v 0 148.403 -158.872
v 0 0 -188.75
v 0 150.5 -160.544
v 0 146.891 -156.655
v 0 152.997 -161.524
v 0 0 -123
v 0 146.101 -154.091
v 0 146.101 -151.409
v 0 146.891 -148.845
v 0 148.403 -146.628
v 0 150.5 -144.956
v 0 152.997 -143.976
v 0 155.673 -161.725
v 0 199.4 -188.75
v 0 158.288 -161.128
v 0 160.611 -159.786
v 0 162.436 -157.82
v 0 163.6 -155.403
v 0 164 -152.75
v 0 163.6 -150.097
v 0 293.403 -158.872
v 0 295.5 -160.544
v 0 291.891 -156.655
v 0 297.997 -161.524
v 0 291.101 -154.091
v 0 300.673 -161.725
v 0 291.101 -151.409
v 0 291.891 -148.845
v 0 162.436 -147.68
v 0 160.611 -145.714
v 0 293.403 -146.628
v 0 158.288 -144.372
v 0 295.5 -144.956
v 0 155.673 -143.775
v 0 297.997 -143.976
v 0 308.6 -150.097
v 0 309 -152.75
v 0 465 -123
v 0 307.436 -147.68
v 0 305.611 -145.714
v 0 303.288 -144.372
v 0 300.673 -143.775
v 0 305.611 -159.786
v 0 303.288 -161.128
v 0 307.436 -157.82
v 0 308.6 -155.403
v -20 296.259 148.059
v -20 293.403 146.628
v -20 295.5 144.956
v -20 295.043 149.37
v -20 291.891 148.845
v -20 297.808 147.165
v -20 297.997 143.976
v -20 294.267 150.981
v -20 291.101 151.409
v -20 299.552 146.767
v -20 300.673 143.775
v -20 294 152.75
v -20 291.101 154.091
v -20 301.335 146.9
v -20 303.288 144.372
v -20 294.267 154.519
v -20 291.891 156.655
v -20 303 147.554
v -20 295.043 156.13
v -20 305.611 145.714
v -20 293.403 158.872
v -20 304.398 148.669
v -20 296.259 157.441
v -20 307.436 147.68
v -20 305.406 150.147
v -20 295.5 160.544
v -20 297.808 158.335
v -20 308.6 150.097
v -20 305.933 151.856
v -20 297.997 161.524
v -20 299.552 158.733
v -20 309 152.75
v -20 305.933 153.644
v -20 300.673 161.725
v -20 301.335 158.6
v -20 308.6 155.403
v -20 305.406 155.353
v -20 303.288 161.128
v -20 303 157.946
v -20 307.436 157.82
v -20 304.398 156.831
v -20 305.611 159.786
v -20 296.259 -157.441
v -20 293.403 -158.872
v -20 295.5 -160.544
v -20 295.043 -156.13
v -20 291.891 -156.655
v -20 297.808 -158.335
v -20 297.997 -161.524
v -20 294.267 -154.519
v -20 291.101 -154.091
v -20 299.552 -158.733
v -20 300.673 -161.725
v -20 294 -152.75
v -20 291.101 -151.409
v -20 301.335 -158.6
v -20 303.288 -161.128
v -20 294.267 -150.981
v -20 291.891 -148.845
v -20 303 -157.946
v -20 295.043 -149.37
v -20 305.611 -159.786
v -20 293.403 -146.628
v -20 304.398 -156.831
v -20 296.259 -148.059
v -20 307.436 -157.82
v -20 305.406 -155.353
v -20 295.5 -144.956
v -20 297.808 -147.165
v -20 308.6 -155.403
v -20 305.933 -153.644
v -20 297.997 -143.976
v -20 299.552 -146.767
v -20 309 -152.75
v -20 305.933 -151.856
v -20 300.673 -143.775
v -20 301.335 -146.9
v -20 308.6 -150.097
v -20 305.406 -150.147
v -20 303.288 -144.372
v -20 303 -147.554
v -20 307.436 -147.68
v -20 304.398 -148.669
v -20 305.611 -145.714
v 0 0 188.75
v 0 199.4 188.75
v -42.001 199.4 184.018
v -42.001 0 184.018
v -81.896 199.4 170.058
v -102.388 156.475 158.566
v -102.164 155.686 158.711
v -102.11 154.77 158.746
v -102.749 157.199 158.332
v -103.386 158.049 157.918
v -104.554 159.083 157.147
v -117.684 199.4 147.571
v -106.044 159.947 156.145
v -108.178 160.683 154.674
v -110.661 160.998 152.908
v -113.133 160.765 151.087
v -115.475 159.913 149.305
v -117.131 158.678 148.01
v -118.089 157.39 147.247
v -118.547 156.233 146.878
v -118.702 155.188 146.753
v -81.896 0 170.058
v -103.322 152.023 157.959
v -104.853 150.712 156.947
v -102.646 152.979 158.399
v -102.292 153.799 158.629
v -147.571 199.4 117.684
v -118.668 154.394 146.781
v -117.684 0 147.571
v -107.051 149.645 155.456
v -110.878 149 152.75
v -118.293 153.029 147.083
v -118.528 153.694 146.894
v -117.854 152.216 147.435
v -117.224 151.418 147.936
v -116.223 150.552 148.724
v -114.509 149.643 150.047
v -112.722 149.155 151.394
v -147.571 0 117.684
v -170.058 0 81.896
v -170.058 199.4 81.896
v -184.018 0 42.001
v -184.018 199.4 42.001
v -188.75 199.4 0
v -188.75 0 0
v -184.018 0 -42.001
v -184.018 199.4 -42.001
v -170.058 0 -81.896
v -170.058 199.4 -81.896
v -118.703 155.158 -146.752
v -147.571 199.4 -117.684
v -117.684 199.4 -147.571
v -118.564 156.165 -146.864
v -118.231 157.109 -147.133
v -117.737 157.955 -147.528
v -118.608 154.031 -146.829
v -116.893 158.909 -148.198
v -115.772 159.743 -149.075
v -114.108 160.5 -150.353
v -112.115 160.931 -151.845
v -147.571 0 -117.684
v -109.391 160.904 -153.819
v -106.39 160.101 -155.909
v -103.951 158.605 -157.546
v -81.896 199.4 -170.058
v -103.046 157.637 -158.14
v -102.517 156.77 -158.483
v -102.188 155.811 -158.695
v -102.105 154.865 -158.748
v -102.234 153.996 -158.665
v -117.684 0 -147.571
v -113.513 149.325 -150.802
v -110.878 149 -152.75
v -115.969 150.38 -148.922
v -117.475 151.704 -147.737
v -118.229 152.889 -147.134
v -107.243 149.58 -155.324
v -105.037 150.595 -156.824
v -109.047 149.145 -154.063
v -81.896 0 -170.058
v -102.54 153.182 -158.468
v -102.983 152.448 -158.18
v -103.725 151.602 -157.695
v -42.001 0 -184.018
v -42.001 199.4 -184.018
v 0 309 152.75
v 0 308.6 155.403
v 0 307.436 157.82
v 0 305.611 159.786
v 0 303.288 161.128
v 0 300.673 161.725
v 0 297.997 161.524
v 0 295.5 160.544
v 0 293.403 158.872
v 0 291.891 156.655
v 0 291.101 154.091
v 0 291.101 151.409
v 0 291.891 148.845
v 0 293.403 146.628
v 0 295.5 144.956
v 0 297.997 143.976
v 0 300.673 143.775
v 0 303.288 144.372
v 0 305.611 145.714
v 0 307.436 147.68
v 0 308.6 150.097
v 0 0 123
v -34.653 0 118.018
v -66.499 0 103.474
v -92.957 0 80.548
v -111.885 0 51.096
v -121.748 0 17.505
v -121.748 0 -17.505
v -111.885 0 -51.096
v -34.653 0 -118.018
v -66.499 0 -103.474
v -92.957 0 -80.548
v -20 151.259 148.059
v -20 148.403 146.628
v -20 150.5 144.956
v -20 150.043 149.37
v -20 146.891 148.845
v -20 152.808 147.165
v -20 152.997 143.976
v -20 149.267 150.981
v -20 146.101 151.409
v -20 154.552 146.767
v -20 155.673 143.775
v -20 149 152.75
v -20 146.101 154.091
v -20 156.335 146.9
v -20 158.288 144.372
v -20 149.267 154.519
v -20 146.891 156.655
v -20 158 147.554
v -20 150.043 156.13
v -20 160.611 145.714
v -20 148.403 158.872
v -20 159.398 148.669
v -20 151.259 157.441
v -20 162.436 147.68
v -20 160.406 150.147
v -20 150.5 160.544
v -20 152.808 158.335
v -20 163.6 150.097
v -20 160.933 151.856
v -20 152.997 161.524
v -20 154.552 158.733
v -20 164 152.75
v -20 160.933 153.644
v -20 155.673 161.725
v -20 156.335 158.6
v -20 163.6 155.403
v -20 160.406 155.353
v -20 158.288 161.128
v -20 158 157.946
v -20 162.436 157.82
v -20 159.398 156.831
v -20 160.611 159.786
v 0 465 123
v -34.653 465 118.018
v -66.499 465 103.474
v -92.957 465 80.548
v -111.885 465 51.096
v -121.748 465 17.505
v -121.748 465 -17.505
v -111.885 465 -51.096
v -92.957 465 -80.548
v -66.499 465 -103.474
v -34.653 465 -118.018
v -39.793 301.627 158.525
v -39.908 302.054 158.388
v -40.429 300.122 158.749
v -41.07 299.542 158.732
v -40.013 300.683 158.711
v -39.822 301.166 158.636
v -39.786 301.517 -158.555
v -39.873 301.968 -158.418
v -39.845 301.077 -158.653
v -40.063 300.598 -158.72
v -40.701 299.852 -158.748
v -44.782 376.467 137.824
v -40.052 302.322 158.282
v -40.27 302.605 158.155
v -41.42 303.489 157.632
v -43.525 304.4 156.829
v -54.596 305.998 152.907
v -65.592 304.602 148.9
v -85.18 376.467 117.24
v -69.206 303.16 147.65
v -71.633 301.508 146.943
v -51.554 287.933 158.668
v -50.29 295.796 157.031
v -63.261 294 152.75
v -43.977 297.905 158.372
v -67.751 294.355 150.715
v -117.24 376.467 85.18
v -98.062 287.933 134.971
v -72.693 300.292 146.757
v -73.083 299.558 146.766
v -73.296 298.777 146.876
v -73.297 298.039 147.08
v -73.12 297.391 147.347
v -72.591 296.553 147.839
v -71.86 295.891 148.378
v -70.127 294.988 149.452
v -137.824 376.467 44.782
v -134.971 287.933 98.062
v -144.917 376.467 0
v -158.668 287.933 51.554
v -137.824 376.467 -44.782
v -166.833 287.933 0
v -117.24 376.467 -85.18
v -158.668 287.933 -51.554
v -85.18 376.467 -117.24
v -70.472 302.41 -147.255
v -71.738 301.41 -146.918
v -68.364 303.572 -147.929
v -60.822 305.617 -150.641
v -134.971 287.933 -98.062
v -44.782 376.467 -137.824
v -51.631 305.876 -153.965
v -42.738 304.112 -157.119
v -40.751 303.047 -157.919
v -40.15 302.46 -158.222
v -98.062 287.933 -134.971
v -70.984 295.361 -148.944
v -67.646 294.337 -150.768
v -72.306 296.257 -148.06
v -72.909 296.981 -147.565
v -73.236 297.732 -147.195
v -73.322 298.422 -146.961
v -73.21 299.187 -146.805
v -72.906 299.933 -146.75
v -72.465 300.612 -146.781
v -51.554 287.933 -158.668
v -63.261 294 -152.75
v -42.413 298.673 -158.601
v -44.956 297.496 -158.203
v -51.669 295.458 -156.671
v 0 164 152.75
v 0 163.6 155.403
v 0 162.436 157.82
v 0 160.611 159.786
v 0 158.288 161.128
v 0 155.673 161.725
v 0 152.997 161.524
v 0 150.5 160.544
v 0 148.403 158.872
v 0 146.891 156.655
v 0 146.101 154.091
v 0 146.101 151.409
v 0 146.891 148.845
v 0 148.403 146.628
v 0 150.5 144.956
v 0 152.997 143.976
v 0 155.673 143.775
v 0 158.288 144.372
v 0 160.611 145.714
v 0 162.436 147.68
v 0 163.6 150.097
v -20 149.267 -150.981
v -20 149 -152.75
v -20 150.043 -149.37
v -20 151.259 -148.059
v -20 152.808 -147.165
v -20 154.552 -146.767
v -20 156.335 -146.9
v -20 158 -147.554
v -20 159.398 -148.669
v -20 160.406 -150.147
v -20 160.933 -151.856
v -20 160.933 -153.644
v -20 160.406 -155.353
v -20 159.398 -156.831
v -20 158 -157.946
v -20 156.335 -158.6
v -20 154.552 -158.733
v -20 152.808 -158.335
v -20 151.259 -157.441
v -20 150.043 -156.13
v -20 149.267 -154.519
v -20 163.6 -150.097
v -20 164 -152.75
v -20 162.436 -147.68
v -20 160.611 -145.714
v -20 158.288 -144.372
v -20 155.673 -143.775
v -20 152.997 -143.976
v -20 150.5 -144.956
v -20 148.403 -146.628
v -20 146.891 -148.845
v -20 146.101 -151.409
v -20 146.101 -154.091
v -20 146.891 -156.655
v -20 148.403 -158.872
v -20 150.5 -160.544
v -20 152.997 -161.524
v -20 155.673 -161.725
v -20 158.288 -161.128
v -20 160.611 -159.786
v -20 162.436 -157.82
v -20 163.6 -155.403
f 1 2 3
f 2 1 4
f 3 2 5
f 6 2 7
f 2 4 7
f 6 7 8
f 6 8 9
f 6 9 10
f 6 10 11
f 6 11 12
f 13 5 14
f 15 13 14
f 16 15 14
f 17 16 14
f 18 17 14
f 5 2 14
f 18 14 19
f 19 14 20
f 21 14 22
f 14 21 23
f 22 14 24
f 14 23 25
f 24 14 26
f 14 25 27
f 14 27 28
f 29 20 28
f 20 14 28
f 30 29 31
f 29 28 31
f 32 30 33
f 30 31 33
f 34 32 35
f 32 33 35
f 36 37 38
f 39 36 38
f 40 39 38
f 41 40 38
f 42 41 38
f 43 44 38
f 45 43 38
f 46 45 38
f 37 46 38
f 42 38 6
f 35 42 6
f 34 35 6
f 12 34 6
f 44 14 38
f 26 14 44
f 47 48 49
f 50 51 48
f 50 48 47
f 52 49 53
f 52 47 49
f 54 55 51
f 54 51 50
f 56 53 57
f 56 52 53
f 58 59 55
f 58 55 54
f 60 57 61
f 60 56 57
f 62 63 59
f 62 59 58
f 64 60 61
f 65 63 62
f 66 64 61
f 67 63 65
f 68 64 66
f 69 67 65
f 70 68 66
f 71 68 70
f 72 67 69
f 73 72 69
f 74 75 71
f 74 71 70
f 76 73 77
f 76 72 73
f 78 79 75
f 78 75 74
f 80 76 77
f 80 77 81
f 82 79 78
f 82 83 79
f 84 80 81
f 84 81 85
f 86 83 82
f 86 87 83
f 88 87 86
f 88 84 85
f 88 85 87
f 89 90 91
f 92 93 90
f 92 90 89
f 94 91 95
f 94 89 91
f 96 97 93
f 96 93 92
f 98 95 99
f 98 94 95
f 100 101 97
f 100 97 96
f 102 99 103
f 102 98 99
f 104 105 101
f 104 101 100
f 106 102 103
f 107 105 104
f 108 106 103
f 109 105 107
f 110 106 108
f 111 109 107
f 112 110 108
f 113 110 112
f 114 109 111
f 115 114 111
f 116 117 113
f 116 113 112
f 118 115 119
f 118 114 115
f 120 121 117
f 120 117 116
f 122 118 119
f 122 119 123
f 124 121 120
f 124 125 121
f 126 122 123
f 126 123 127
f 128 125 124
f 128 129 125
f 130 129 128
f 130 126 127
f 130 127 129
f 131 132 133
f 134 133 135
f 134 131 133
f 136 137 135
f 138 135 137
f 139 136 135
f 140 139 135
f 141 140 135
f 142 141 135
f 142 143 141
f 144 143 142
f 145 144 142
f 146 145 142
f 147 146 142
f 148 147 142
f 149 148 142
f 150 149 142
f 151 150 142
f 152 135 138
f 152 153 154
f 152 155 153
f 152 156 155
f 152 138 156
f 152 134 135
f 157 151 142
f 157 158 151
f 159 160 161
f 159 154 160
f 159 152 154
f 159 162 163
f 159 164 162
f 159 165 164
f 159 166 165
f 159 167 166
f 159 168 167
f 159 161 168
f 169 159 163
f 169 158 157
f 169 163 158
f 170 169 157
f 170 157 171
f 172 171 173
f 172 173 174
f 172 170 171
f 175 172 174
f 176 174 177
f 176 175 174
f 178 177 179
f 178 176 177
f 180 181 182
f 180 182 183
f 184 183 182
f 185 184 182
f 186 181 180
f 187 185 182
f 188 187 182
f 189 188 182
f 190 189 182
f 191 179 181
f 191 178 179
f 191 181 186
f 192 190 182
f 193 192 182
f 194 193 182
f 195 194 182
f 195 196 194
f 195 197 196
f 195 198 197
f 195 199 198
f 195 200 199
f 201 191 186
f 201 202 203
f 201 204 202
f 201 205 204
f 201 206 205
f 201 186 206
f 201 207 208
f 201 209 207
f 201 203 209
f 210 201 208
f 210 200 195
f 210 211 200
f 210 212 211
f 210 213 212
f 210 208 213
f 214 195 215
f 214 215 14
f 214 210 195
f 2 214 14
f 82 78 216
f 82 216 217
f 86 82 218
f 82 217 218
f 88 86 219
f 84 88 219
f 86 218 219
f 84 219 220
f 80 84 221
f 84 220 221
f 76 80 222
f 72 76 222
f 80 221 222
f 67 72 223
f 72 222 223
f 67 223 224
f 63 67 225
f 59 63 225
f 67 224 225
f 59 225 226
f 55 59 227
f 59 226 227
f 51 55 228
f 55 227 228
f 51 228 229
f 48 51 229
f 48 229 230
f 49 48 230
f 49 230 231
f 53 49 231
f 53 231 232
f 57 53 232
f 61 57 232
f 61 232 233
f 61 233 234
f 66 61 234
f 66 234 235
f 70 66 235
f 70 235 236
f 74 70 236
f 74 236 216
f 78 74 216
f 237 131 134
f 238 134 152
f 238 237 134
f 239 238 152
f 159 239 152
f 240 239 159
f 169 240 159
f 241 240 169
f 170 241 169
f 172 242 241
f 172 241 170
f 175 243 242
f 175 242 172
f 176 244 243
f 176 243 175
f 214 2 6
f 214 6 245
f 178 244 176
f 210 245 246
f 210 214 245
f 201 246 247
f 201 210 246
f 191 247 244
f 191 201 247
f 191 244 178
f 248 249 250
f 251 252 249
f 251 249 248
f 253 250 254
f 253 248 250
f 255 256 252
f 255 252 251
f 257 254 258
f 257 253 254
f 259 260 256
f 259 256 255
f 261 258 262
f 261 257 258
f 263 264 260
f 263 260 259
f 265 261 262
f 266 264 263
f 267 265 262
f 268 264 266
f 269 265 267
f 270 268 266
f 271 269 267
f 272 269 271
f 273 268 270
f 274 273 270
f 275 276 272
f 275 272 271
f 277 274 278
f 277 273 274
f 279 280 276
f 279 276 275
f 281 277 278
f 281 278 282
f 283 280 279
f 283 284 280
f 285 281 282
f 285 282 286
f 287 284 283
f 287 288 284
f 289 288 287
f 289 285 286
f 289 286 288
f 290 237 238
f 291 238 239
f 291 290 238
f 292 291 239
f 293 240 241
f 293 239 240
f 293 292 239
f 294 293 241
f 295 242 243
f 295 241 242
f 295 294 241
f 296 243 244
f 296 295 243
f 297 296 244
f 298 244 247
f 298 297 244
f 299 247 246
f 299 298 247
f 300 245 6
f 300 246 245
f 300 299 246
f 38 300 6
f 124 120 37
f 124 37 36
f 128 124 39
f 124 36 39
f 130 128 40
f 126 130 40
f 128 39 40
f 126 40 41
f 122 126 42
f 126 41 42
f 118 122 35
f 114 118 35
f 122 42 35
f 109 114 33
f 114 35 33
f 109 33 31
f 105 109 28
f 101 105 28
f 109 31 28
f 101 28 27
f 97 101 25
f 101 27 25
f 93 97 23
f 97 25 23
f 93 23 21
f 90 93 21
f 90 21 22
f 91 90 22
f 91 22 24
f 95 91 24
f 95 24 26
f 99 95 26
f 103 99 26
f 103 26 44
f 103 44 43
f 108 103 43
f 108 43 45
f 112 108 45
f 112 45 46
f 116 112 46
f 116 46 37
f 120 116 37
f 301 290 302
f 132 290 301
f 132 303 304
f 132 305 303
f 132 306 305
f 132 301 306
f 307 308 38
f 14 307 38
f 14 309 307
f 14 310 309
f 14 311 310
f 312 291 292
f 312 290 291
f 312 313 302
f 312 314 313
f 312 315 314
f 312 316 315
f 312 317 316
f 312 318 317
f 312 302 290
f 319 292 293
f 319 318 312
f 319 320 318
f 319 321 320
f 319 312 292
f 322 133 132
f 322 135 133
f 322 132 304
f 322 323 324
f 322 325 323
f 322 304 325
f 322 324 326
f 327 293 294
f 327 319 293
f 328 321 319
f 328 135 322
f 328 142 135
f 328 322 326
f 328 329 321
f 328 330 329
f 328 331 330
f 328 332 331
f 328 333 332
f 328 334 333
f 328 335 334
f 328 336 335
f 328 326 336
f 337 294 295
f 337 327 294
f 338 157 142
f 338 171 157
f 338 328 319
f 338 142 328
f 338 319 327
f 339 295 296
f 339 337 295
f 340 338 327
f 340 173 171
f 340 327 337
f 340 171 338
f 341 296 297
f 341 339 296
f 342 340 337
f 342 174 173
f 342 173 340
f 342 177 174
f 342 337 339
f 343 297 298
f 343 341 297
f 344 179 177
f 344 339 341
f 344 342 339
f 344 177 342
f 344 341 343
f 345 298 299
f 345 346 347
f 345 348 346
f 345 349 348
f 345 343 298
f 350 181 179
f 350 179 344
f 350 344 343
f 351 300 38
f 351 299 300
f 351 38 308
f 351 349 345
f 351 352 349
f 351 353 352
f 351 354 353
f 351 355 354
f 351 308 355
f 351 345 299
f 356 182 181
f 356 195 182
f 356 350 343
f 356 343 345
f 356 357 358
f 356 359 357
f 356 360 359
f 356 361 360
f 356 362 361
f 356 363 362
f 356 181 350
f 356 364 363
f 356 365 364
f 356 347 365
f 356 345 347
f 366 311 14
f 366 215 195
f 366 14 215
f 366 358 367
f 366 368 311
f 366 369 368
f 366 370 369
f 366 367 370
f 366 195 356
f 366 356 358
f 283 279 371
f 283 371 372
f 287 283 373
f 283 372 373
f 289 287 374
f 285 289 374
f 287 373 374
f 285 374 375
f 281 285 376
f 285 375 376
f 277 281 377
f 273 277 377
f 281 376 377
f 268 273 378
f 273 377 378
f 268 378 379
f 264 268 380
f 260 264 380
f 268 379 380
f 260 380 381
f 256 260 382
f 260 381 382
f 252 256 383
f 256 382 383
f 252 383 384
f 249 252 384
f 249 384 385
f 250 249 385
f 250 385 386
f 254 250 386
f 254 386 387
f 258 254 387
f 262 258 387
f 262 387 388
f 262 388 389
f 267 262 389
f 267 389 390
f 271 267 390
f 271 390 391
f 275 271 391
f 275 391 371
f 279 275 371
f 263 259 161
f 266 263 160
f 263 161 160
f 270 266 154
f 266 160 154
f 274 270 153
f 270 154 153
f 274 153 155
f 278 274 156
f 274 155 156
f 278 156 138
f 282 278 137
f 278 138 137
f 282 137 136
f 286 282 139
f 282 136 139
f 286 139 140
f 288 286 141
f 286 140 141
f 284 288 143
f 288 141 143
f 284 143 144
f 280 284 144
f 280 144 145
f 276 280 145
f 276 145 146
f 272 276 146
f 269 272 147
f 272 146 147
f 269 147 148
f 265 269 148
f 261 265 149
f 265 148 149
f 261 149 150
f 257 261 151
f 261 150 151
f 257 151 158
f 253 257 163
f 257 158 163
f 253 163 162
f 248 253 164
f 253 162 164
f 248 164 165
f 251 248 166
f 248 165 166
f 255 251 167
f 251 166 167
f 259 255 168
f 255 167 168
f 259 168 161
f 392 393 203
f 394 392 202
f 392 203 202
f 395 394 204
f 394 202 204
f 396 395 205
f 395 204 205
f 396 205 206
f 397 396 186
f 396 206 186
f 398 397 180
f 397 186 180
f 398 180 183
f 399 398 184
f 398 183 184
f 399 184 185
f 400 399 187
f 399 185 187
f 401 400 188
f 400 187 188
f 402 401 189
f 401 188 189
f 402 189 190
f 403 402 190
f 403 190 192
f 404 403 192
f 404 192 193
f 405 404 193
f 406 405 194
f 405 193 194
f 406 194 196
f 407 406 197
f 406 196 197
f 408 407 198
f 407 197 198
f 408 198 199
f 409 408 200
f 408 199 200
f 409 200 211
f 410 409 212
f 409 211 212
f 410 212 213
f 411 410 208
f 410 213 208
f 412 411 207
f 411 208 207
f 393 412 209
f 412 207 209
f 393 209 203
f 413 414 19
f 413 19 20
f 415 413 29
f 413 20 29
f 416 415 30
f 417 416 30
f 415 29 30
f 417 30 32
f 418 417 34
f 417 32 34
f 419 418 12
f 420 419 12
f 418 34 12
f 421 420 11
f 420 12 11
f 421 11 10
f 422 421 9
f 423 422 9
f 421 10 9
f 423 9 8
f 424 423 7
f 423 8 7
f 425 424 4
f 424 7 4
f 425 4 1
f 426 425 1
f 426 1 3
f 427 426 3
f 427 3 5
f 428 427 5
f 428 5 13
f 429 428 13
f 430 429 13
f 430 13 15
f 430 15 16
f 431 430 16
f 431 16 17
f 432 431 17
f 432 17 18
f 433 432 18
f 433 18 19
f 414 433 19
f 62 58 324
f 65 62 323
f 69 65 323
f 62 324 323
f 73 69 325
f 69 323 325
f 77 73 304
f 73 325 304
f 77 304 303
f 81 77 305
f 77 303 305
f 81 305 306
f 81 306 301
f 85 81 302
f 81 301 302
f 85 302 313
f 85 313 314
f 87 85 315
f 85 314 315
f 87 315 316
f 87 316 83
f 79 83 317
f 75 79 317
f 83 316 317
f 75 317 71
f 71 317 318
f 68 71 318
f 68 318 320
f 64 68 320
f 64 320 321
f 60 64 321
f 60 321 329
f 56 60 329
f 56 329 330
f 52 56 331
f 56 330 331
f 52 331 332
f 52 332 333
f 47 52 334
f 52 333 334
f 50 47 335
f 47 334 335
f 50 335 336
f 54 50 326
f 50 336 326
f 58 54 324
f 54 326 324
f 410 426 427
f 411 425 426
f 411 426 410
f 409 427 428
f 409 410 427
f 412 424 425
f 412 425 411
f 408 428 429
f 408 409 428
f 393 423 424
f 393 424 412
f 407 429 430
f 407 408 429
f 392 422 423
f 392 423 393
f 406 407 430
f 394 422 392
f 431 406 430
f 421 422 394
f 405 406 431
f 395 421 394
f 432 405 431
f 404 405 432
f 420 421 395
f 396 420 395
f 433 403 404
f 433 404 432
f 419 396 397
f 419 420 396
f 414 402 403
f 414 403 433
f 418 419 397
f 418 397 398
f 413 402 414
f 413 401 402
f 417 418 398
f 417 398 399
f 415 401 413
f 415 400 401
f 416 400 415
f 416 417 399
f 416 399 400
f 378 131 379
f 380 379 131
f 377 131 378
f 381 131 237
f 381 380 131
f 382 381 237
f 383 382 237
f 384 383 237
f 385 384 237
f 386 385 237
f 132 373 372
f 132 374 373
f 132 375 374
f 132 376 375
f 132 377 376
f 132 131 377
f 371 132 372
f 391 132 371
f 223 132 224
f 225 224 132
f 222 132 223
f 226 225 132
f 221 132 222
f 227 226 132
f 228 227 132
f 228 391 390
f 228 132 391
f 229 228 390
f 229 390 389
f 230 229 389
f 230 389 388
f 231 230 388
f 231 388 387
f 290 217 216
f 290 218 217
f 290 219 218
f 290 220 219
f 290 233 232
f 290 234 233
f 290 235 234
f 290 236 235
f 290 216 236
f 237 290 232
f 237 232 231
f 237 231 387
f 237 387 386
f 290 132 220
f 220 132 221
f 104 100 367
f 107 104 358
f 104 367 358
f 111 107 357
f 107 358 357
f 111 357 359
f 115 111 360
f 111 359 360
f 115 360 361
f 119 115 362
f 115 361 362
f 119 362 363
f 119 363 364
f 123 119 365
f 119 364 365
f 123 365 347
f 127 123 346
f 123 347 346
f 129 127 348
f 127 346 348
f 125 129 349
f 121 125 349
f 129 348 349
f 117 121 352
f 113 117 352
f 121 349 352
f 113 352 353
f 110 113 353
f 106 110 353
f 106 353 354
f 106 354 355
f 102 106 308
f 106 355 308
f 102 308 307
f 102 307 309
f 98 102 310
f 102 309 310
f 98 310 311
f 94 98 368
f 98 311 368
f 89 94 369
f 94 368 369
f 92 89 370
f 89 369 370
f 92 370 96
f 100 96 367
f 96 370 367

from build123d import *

# Parameters (mm, degrees)
F2_ANGLE       = 180
F4_D           = 12
F4_CBORE_D     = 18
F4_CBORE_DEPTH = 20


with BuildPart() as f2:
    # F0 (on Top) → F2 (revolve, symmetric)
    with BuildSketch(Plane.XY) as f2_sk:
        Polygon((-188.75, 0), (-123, 0), (-123, 465), (-188.75, 199.4), align=None)
    revolve(axis=Axis((0, 70.437513, 0), (0, 1, 0)), revolution_arc=F2_ANGLE / 2)
    revolve(f2_sk.sketch, axis=Axis((0, 70.437513, 0), (0, -1, 0)), revolution_arc=F2_ANGLE / 2)

    # F4 (through all)
    with Locations(Plane.YZ):
        with Locations((155, 152.75), (300, 152.75), (300, -152.75), (155, -152.75)):
            CounterBoreHole(F4_D / 2, F4_CBORE_D / 2, F4_CBORE_DEPTH)


solid = f2.part
